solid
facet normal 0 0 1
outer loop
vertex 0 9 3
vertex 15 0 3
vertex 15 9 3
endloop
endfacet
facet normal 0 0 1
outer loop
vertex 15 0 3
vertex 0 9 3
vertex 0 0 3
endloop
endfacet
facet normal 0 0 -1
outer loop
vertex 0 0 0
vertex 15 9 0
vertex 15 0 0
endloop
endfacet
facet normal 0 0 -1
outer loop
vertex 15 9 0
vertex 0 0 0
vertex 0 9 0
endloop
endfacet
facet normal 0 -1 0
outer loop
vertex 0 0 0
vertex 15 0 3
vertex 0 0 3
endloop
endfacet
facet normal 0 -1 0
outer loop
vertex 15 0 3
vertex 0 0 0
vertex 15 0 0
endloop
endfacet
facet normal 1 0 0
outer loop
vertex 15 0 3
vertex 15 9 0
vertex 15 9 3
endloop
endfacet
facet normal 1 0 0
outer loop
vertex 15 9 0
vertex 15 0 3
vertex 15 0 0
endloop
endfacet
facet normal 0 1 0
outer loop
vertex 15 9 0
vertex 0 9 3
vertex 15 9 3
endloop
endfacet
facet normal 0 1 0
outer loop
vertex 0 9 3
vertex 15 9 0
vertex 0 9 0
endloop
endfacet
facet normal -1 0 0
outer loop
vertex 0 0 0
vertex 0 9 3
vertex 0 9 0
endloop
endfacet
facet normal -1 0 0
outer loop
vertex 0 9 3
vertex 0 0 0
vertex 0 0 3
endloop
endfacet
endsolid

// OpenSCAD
// Generated by SolidPython 1.0.1 on 2020-07-29 00:46:55


cube(size = [15, 9, 3]);
/***********************************************
*********      SolidPython code:      **********
************************************************
 
# import packages: SolidPython
from solid import *
from solid.utils import *
from itertools import chain, combinations, permutations


class Resize:

    def __init__(self, scad_file):
        self.scad_file = scad_file
        #self.scad_file = import_scad(scad_file)
        # cone/cylinder param:
        self.r1 = 0
        self.r2 = 0
        self.h = 0
        # rectangular prism param:
        self.w = 0
        self.l = 0
        # ellipse param:
        self.r = 0

    # import OpenScad code (file name corresponds to shape)


    # classify shape + parameters
    def assign(self, param1, param2, param3):
        if self.scad_file == 'cone.scad':
            self.r1 = param1
            self.r2 = param2
            self.h = param3
        elif self.scad_file == 'cylinder.scad':
            self.r1 = param1
            self.r2 = param2
            self.h = param3
        elif self.scad_file == 'rectangularPrism.scad':
            self.h = param1
            self.l = param2
            self.w = param3
        else:
            self.r = param1
            self.h = param2

    # resize parameters
    def iterate(self):
        x = range(3, 20, 2)
        i = 1
        if self.scad_file == 'cone.scad':
            tempList = list(permutations(x, 2))
            for temp in tempList:
                param1 = temp[0]
                param2 = temp[1]
                filepath = 'produced_scad_files/' + 'cone' + str(param1) + '_' + str(param2) + '_' + '.scad'
                scad_render_to_file(cylinder(h=param1, r1=param2, r2=0), filepath)

        elif self.scad_file == 'cylinder.scad':
            tempList = list(permutations(x, 3))
            for temp in tempList:
                param1 = temp[0]
                param2 = temp[1]
                filepath = 'produced_scad_files/' + 'cylinder' + str(param1) + '_' + str(param2) + '_' + '.scad'
                scad_render_to_file(cylinder(h=param1, r1=param2, r2=param2), filepath)

        elif self.scad_file == 'rectangularPrism.scad':
            tempList = list(permutations(x, 3))
            for temp in tempList:
                param1 = temp[0]
                param2 = temp[1]
                param3 = temp[2]
                filepath = 'produced_scad_files/' + 'rectangularPrism' + str(param1) + '_' + str(param2) + '_' + str(
                    param3) + '.scad'
                scad_render_to_file(cube(size=(param1, param2, param3)), filepath)

        elif self.scad_file == 'ellipse.scad':
            tempList = list(permutations(x, 4))
            for temp in tempList:
                param1 = temp[0]
                param2 = temp[1]
                param3 = temp[2]
                param4 = temp[3]
                filepath = 'produced_scad_files/' + 'ellipse' + str(param1) + '_' + str(param2) + '_' + str(param3) + '_' + str(param4) + '.scad'
                scad_render_to_file(scale([param1, param2, param3])(sphere(r=param4)), filepath)

    def render_to_scadfile(self):
        scad_render_to_file(scad, 'example.scad') 
 
************************************************/
